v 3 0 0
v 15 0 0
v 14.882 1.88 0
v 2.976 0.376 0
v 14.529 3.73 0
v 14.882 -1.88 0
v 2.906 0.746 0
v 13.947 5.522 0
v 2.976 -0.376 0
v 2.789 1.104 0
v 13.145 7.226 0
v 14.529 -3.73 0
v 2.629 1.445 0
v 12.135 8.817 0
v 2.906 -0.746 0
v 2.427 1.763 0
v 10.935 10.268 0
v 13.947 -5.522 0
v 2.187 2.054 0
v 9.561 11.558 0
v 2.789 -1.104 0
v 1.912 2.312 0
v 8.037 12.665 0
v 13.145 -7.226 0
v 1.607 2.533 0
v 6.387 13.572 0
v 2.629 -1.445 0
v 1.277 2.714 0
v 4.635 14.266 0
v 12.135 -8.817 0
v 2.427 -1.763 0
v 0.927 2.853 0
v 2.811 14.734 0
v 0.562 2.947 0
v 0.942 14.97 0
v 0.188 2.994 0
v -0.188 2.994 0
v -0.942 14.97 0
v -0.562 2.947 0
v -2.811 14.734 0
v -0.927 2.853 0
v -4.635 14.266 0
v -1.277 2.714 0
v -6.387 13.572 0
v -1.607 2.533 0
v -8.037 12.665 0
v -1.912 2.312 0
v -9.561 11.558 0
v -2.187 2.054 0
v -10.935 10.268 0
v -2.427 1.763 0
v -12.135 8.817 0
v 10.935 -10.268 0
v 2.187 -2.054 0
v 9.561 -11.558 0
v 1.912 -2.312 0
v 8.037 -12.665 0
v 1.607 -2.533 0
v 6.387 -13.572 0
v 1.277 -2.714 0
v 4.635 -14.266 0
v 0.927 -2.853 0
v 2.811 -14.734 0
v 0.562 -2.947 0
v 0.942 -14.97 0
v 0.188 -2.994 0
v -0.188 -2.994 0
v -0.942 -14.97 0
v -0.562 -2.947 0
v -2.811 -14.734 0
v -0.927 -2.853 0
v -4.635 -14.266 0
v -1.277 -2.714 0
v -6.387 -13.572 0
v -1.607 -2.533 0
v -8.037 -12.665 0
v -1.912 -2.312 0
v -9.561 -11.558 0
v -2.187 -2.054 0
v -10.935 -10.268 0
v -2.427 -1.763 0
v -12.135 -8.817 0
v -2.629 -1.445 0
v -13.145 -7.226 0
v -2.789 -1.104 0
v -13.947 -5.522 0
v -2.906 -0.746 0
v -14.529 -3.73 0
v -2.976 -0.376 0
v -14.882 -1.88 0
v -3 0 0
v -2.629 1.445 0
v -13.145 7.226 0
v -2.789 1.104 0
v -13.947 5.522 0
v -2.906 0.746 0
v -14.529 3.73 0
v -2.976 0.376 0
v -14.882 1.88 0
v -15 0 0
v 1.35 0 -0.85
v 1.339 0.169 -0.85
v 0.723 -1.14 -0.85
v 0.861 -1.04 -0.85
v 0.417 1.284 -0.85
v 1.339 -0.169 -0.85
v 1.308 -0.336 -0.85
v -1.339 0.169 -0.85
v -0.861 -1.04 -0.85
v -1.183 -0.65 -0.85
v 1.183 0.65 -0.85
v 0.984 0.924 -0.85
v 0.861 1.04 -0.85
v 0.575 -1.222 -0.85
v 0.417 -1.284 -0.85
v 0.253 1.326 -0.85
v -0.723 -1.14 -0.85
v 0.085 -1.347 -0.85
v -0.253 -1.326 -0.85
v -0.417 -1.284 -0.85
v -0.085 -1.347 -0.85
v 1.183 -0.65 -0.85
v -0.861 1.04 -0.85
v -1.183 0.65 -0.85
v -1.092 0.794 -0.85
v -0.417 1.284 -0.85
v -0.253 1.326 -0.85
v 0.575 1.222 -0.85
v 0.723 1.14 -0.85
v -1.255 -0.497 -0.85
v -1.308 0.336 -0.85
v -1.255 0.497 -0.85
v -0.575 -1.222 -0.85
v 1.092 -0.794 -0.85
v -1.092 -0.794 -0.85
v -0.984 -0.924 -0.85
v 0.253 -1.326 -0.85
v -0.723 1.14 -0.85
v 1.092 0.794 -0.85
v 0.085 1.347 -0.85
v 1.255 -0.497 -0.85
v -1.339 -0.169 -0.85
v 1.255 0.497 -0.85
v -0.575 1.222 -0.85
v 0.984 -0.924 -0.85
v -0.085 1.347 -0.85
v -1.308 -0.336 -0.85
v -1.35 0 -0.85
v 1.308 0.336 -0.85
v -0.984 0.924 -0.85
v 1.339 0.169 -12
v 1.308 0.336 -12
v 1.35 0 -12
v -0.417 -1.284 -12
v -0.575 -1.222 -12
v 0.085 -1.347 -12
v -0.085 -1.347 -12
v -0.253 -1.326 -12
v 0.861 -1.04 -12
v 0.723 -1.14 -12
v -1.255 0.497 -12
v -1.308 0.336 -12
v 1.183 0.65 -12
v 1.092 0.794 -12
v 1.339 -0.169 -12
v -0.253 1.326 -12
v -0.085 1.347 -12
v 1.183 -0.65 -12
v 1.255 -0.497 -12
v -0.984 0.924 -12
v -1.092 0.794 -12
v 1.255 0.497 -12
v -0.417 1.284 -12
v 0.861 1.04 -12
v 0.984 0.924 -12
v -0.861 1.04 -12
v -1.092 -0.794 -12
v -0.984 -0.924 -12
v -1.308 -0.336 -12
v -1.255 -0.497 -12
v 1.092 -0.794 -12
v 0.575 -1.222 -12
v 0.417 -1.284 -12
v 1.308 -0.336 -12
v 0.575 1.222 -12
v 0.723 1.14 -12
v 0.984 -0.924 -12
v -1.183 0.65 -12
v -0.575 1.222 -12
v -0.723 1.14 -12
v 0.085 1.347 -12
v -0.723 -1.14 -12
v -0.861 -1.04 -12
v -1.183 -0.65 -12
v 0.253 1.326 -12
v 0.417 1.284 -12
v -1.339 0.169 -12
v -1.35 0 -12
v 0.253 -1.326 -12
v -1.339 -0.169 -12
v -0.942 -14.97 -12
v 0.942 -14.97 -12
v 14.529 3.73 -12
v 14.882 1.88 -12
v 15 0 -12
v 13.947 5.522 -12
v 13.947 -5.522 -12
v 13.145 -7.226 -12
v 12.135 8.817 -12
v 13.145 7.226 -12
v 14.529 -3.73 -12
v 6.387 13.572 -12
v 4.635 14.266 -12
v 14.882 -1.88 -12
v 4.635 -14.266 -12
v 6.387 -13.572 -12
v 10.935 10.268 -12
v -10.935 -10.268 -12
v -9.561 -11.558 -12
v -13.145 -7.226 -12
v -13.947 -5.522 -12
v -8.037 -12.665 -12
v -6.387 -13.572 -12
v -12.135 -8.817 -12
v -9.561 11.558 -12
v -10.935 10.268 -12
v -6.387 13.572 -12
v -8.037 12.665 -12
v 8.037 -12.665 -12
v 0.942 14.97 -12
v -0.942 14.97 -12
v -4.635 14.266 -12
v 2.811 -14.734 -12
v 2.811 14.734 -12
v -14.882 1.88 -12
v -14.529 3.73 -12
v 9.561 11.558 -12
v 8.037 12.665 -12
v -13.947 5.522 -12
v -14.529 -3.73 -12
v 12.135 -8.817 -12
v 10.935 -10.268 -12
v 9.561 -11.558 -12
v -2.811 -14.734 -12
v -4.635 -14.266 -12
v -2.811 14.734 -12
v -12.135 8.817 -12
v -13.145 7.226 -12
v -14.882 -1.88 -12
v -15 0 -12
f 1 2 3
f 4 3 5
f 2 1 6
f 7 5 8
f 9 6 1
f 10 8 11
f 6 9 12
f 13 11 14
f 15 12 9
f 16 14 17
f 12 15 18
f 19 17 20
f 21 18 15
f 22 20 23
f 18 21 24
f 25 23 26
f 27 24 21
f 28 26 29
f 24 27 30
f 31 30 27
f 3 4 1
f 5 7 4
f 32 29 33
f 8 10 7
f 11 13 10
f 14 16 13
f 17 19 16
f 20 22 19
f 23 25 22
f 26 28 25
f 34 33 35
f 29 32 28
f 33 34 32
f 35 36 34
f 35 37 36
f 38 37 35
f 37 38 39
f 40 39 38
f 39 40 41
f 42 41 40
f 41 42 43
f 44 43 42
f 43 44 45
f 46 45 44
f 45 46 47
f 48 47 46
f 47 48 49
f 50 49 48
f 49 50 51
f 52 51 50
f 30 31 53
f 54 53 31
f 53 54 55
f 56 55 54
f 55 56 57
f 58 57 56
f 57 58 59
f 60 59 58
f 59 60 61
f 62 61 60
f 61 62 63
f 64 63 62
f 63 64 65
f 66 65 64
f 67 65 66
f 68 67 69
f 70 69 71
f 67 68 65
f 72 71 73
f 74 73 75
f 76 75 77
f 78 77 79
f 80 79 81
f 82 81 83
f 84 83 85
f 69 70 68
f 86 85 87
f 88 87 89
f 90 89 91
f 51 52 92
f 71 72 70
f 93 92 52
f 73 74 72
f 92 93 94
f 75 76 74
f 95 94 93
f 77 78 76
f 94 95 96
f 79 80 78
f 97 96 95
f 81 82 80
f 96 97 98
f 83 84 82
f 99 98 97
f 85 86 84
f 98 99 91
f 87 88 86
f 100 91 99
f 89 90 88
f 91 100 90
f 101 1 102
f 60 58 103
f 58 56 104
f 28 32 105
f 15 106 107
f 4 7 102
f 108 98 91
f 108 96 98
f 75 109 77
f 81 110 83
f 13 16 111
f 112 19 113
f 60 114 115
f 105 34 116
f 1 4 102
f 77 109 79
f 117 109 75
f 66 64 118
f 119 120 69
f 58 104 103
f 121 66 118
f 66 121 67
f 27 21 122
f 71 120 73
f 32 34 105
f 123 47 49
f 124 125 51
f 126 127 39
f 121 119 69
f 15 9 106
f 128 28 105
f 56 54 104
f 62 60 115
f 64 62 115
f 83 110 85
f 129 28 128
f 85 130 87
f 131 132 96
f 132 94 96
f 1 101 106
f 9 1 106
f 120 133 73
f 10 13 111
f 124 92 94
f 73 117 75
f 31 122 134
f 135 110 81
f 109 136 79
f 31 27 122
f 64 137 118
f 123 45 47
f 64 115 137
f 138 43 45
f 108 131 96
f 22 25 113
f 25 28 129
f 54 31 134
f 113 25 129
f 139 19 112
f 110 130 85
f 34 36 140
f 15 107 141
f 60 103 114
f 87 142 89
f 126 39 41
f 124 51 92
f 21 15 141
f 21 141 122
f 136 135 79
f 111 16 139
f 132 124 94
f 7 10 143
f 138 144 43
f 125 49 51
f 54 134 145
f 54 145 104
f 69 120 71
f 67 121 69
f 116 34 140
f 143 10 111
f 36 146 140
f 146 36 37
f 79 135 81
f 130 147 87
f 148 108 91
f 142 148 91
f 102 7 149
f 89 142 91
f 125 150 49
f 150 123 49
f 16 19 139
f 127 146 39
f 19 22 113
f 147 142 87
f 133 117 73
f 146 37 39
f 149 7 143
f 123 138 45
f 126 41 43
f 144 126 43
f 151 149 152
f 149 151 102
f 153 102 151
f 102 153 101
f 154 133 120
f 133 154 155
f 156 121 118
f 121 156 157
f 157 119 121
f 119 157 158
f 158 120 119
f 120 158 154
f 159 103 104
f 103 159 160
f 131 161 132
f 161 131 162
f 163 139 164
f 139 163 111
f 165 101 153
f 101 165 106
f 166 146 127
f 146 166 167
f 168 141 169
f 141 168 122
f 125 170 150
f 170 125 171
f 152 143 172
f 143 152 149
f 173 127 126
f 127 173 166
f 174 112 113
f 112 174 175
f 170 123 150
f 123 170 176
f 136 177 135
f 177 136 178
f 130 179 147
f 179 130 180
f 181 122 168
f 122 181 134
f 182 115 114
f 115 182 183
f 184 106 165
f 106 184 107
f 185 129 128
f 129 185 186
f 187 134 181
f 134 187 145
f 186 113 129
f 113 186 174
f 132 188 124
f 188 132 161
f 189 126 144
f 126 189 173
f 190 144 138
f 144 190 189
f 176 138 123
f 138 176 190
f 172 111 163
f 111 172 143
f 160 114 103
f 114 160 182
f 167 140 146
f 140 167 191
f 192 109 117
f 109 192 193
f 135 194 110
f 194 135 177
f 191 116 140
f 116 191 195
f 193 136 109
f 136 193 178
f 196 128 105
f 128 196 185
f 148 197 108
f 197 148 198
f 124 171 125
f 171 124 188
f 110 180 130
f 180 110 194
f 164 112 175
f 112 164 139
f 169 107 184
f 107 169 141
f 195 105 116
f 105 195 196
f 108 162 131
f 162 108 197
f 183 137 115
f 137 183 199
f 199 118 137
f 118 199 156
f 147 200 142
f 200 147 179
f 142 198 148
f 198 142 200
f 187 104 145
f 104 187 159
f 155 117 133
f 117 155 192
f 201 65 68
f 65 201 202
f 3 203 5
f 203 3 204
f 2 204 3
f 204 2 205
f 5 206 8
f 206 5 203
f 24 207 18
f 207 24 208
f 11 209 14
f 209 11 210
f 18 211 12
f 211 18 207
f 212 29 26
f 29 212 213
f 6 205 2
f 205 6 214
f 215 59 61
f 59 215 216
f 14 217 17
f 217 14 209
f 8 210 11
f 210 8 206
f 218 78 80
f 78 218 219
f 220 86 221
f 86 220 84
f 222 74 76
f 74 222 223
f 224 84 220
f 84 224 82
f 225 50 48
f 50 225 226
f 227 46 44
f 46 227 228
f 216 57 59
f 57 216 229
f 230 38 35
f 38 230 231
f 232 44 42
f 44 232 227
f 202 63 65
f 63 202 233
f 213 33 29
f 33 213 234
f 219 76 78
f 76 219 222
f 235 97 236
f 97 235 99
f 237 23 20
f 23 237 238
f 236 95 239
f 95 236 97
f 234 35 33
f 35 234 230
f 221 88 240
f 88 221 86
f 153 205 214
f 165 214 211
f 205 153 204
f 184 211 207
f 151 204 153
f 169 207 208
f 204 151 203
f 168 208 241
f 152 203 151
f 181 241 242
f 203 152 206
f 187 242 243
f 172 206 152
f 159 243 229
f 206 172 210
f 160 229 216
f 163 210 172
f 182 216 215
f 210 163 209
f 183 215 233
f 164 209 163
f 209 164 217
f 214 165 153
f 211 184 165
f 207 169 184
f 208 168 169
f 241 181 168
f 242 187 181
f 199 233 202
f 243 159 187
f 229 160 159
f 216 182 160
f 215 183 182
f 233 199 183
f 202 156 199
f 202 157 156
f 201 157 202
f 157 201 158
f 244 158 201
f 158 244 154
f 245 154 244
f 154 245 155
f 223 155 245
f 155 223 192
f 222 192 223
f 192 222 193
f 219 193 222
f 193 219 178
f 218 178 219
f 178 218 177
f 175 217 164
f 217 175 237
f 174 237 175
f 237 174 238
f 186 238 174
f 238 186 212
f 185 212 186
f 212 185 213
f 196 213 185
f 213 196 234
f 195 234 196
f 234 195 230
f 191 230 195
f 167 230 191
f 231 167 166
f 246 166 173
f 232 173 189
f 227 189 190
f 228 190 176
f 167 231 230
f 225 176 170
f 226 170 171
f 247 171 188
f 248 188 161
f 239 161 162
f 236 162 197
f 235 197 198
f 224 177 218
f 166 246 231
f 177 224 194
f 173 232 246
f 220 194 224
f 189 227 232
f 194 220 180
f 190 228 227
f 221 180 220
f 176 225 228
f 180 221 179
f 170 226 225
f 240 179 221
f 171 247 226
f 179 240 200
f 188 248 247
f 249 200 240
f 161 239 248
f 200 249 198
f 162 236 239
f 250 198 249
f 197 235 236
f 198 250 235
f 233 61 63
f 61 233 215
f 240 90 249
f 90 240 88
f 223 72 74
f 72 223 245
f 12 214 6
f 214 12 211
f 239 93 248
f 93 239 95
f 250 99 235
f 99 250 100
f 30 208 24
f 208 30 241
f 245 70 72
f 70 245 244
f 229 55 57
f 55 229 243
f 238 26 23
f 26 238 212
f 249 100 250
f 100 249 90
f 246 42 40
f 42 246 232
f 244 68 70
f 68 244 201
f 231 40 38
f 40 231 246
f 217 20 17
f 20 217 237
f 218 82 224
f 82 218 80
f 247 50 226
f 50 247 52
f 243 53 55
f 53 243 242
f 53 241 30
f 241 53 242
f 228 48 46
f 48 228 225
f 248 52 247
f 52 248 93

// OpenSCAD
$fn = 50;

difference() {
	union() {
		translate(v = [0, 0, -12.0]) {
			cylinder(h = 12, r = 15.0);
		}
	}
	union() {
		translate(v = [0, 0, 0]) {
			rotate(a = [0, 0, 0]) {
				difference() {
					union() {
						translate(v = [0, 0, -15.0]) {
							cylinder(h = 15, r = 1.0);
						}
						translate(v = [0, 0, -0.85]) {
							cylinder(h = 0.85, r1 = 1.35, r2 = 3.0);
						}
						translate(v = [0, 0, -15.0]) {
							cylinder(h = 15, r = 1.35);
						}
						translate(v = [0, 0, -15.0]) {
							cylinder(h = 15, r = 1.0);
						}
					}
					union();
				}
			}
		}
	}
}
